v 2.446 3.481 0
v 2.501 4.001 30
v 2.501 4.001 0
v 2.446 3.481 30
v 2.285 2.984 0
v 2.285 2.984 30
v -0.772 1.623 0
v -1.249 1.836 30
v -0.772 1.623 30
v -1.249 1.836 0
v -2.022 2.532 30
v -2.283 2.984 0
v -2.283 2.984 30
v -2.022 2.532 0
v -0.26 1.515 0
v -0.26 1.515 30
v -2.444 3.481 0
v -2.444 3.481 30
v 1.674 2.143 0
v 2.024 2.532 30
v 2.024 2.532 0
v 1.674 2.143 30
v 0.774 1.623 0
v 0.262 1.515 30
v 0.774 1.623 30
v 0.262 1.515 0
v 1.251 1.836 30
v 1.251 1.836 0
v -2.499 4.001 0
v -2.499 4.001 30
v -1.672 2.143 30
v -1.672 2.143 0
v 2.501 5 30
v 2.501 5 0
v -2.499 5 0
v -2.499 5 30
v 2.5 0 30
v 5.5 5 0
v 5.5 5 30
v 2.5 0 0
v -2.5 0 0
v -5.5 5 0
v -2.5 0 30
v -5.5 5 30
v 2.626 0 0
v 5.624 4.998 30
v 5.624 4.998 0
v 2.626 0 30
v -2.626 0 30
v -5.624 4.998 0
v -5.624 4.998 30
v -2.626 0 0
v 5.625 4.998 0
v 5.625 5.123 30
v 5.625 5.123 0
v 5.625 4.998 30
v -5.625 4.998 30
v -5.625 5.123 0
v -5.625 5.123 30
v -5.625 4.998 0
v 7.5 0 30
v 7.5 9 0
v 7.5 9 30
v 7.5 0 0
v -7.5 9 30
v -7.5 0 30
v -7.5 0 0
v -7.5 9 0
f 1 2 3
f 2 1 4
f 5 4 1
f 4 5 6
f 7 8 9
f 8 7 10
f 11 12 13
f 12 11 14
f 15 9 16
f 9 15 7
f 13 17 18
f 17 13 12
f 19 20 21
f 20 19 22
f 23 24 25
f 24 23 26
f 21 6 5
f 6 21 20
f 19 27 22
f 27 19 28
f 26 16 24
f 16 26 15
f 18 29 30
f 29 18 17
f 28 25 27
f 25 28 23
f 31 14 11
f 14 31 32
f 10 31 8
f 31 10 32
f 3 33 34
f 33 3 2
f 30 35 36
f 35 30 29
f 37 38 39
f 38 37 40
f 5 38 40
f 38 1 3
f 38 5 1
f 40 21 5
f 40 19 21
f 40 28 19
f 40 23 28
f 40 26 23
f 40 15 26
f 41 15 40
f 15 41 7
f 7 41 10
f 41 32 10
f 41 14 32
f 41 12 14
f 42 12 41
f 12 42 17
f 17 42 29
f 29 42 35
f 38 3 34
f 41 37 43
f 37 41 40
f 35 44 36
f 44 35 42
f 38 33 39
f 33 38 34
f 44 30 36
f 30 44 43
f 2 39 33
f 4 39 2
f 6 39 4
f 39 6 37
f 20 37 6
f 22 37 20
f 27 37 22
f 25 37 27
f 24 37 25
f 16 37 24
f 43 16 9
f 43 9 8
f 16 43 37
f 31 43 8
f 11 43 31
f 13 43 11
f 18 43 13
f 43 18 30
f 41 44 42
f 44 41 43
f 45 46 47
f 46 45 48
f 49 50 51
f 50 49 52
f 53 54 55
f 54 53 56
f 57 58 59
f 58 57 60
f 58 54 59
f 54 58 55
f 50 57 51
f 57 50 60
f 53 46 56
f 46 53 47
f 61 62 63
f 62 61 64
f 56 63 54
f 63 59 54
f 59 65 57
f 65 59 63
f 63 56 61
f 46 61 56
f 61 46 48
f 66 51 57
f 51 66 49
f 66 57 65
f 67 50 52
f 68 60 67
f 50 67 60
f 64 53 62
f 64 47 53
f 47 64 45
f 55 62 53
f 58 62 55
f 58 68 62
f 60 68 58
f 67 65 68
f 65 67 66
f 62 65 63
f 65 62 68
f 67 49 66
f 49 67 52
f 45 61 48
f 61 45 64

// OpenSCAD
male_dovetail(max_width=11, min_width=5, depth=5, height=30, cutout_width=5, cutout_depth=3.5);
//This produces a male dovetail with the dimensions specified. The cutout_width and depth specify the dimensions of a cutout in the center of the dovetail that will hopefully provide some spring or flex to allow them to go together tightly.
//
female_dovetail(max_width=11, min_width=5, depth=5, height=30, block_width=15, block_depth=9, clearance=0.25);
//This produces a block of the specified dimensions with a dovetail cut out of it with an added clearance on three sides.
//
//female_dovetail_negative(max_width=11, min_width=5, depth=5, height=30, clearance=0.25)
//This produces the negative of the above module so that you can subtract it from an object.


module female_dovetail_negative(max_width=11, min_width=5, depth=5, height=30, clearance=0.25) {
	union() {
		translate([0,-0.001,-0.05])
			dovetail_3d(max_width+clearance,min_width+clearance,depth,height+0.1);
			translate([-(max_width+clearance)/2, depth-0.002,-0.5])
				cube([max_width+clearance,clearance/2,height+1]);
	}
}

module female_dovetail(max_width=11, min_width=5, depth=5, height=30, block_width=15, block_depth=9, clearance=0.25) {
		difference() {
			translate([-block_width/2,0,0]) cube([block_width, block_depth, height]);
			female_dovetail_negative(max_width, min_width, depth, height, clearance);
		}
}

module male_dovetail(max_width=11, min_width=51, depth=5, height=30, cutout_width=5, cutout_depth=3.5) {
	difference() {
		dovetail_3d(max_width,min_width,depth,height);
		translate([0.001,depth+0.001,-0.05])
			dovetail_cutout(cutout_width, cutout_depth, height+0.1);
	}
}

module dovetail_3d(max_width=11, min_width=5, depth=5, height=30) {
	linear_extrude(height=height, convexity=2)
		dovetail_2d(max_width,min_width,depth);
}

module dovetail_2d(max_width=11, min_width=5, depth=5) {
	angle=atan((max_width/2-min_width/2)/depth);
	polygon(paths=[[0,1,2,3,0]], points=[[-min_width/2,0], [-max_width/2,depth], [max_width/2, depth], [min_width/2,0]]);
}

module dovetail_cutout(width=5, depth=4, height=30) {
	translate([0,-depth+width/2,0])
		union() {
			translate([-width/2,0,0])
				cube([width,depth-width/2,height]);
			difference() {
				cylinder(r=width/2, h=height, $fs=0.25);
				translate([-width/2-0.05,0.05,-0.05]) cube([width+0.1,width+0.1,height+0.1]);
			}
		}
}
